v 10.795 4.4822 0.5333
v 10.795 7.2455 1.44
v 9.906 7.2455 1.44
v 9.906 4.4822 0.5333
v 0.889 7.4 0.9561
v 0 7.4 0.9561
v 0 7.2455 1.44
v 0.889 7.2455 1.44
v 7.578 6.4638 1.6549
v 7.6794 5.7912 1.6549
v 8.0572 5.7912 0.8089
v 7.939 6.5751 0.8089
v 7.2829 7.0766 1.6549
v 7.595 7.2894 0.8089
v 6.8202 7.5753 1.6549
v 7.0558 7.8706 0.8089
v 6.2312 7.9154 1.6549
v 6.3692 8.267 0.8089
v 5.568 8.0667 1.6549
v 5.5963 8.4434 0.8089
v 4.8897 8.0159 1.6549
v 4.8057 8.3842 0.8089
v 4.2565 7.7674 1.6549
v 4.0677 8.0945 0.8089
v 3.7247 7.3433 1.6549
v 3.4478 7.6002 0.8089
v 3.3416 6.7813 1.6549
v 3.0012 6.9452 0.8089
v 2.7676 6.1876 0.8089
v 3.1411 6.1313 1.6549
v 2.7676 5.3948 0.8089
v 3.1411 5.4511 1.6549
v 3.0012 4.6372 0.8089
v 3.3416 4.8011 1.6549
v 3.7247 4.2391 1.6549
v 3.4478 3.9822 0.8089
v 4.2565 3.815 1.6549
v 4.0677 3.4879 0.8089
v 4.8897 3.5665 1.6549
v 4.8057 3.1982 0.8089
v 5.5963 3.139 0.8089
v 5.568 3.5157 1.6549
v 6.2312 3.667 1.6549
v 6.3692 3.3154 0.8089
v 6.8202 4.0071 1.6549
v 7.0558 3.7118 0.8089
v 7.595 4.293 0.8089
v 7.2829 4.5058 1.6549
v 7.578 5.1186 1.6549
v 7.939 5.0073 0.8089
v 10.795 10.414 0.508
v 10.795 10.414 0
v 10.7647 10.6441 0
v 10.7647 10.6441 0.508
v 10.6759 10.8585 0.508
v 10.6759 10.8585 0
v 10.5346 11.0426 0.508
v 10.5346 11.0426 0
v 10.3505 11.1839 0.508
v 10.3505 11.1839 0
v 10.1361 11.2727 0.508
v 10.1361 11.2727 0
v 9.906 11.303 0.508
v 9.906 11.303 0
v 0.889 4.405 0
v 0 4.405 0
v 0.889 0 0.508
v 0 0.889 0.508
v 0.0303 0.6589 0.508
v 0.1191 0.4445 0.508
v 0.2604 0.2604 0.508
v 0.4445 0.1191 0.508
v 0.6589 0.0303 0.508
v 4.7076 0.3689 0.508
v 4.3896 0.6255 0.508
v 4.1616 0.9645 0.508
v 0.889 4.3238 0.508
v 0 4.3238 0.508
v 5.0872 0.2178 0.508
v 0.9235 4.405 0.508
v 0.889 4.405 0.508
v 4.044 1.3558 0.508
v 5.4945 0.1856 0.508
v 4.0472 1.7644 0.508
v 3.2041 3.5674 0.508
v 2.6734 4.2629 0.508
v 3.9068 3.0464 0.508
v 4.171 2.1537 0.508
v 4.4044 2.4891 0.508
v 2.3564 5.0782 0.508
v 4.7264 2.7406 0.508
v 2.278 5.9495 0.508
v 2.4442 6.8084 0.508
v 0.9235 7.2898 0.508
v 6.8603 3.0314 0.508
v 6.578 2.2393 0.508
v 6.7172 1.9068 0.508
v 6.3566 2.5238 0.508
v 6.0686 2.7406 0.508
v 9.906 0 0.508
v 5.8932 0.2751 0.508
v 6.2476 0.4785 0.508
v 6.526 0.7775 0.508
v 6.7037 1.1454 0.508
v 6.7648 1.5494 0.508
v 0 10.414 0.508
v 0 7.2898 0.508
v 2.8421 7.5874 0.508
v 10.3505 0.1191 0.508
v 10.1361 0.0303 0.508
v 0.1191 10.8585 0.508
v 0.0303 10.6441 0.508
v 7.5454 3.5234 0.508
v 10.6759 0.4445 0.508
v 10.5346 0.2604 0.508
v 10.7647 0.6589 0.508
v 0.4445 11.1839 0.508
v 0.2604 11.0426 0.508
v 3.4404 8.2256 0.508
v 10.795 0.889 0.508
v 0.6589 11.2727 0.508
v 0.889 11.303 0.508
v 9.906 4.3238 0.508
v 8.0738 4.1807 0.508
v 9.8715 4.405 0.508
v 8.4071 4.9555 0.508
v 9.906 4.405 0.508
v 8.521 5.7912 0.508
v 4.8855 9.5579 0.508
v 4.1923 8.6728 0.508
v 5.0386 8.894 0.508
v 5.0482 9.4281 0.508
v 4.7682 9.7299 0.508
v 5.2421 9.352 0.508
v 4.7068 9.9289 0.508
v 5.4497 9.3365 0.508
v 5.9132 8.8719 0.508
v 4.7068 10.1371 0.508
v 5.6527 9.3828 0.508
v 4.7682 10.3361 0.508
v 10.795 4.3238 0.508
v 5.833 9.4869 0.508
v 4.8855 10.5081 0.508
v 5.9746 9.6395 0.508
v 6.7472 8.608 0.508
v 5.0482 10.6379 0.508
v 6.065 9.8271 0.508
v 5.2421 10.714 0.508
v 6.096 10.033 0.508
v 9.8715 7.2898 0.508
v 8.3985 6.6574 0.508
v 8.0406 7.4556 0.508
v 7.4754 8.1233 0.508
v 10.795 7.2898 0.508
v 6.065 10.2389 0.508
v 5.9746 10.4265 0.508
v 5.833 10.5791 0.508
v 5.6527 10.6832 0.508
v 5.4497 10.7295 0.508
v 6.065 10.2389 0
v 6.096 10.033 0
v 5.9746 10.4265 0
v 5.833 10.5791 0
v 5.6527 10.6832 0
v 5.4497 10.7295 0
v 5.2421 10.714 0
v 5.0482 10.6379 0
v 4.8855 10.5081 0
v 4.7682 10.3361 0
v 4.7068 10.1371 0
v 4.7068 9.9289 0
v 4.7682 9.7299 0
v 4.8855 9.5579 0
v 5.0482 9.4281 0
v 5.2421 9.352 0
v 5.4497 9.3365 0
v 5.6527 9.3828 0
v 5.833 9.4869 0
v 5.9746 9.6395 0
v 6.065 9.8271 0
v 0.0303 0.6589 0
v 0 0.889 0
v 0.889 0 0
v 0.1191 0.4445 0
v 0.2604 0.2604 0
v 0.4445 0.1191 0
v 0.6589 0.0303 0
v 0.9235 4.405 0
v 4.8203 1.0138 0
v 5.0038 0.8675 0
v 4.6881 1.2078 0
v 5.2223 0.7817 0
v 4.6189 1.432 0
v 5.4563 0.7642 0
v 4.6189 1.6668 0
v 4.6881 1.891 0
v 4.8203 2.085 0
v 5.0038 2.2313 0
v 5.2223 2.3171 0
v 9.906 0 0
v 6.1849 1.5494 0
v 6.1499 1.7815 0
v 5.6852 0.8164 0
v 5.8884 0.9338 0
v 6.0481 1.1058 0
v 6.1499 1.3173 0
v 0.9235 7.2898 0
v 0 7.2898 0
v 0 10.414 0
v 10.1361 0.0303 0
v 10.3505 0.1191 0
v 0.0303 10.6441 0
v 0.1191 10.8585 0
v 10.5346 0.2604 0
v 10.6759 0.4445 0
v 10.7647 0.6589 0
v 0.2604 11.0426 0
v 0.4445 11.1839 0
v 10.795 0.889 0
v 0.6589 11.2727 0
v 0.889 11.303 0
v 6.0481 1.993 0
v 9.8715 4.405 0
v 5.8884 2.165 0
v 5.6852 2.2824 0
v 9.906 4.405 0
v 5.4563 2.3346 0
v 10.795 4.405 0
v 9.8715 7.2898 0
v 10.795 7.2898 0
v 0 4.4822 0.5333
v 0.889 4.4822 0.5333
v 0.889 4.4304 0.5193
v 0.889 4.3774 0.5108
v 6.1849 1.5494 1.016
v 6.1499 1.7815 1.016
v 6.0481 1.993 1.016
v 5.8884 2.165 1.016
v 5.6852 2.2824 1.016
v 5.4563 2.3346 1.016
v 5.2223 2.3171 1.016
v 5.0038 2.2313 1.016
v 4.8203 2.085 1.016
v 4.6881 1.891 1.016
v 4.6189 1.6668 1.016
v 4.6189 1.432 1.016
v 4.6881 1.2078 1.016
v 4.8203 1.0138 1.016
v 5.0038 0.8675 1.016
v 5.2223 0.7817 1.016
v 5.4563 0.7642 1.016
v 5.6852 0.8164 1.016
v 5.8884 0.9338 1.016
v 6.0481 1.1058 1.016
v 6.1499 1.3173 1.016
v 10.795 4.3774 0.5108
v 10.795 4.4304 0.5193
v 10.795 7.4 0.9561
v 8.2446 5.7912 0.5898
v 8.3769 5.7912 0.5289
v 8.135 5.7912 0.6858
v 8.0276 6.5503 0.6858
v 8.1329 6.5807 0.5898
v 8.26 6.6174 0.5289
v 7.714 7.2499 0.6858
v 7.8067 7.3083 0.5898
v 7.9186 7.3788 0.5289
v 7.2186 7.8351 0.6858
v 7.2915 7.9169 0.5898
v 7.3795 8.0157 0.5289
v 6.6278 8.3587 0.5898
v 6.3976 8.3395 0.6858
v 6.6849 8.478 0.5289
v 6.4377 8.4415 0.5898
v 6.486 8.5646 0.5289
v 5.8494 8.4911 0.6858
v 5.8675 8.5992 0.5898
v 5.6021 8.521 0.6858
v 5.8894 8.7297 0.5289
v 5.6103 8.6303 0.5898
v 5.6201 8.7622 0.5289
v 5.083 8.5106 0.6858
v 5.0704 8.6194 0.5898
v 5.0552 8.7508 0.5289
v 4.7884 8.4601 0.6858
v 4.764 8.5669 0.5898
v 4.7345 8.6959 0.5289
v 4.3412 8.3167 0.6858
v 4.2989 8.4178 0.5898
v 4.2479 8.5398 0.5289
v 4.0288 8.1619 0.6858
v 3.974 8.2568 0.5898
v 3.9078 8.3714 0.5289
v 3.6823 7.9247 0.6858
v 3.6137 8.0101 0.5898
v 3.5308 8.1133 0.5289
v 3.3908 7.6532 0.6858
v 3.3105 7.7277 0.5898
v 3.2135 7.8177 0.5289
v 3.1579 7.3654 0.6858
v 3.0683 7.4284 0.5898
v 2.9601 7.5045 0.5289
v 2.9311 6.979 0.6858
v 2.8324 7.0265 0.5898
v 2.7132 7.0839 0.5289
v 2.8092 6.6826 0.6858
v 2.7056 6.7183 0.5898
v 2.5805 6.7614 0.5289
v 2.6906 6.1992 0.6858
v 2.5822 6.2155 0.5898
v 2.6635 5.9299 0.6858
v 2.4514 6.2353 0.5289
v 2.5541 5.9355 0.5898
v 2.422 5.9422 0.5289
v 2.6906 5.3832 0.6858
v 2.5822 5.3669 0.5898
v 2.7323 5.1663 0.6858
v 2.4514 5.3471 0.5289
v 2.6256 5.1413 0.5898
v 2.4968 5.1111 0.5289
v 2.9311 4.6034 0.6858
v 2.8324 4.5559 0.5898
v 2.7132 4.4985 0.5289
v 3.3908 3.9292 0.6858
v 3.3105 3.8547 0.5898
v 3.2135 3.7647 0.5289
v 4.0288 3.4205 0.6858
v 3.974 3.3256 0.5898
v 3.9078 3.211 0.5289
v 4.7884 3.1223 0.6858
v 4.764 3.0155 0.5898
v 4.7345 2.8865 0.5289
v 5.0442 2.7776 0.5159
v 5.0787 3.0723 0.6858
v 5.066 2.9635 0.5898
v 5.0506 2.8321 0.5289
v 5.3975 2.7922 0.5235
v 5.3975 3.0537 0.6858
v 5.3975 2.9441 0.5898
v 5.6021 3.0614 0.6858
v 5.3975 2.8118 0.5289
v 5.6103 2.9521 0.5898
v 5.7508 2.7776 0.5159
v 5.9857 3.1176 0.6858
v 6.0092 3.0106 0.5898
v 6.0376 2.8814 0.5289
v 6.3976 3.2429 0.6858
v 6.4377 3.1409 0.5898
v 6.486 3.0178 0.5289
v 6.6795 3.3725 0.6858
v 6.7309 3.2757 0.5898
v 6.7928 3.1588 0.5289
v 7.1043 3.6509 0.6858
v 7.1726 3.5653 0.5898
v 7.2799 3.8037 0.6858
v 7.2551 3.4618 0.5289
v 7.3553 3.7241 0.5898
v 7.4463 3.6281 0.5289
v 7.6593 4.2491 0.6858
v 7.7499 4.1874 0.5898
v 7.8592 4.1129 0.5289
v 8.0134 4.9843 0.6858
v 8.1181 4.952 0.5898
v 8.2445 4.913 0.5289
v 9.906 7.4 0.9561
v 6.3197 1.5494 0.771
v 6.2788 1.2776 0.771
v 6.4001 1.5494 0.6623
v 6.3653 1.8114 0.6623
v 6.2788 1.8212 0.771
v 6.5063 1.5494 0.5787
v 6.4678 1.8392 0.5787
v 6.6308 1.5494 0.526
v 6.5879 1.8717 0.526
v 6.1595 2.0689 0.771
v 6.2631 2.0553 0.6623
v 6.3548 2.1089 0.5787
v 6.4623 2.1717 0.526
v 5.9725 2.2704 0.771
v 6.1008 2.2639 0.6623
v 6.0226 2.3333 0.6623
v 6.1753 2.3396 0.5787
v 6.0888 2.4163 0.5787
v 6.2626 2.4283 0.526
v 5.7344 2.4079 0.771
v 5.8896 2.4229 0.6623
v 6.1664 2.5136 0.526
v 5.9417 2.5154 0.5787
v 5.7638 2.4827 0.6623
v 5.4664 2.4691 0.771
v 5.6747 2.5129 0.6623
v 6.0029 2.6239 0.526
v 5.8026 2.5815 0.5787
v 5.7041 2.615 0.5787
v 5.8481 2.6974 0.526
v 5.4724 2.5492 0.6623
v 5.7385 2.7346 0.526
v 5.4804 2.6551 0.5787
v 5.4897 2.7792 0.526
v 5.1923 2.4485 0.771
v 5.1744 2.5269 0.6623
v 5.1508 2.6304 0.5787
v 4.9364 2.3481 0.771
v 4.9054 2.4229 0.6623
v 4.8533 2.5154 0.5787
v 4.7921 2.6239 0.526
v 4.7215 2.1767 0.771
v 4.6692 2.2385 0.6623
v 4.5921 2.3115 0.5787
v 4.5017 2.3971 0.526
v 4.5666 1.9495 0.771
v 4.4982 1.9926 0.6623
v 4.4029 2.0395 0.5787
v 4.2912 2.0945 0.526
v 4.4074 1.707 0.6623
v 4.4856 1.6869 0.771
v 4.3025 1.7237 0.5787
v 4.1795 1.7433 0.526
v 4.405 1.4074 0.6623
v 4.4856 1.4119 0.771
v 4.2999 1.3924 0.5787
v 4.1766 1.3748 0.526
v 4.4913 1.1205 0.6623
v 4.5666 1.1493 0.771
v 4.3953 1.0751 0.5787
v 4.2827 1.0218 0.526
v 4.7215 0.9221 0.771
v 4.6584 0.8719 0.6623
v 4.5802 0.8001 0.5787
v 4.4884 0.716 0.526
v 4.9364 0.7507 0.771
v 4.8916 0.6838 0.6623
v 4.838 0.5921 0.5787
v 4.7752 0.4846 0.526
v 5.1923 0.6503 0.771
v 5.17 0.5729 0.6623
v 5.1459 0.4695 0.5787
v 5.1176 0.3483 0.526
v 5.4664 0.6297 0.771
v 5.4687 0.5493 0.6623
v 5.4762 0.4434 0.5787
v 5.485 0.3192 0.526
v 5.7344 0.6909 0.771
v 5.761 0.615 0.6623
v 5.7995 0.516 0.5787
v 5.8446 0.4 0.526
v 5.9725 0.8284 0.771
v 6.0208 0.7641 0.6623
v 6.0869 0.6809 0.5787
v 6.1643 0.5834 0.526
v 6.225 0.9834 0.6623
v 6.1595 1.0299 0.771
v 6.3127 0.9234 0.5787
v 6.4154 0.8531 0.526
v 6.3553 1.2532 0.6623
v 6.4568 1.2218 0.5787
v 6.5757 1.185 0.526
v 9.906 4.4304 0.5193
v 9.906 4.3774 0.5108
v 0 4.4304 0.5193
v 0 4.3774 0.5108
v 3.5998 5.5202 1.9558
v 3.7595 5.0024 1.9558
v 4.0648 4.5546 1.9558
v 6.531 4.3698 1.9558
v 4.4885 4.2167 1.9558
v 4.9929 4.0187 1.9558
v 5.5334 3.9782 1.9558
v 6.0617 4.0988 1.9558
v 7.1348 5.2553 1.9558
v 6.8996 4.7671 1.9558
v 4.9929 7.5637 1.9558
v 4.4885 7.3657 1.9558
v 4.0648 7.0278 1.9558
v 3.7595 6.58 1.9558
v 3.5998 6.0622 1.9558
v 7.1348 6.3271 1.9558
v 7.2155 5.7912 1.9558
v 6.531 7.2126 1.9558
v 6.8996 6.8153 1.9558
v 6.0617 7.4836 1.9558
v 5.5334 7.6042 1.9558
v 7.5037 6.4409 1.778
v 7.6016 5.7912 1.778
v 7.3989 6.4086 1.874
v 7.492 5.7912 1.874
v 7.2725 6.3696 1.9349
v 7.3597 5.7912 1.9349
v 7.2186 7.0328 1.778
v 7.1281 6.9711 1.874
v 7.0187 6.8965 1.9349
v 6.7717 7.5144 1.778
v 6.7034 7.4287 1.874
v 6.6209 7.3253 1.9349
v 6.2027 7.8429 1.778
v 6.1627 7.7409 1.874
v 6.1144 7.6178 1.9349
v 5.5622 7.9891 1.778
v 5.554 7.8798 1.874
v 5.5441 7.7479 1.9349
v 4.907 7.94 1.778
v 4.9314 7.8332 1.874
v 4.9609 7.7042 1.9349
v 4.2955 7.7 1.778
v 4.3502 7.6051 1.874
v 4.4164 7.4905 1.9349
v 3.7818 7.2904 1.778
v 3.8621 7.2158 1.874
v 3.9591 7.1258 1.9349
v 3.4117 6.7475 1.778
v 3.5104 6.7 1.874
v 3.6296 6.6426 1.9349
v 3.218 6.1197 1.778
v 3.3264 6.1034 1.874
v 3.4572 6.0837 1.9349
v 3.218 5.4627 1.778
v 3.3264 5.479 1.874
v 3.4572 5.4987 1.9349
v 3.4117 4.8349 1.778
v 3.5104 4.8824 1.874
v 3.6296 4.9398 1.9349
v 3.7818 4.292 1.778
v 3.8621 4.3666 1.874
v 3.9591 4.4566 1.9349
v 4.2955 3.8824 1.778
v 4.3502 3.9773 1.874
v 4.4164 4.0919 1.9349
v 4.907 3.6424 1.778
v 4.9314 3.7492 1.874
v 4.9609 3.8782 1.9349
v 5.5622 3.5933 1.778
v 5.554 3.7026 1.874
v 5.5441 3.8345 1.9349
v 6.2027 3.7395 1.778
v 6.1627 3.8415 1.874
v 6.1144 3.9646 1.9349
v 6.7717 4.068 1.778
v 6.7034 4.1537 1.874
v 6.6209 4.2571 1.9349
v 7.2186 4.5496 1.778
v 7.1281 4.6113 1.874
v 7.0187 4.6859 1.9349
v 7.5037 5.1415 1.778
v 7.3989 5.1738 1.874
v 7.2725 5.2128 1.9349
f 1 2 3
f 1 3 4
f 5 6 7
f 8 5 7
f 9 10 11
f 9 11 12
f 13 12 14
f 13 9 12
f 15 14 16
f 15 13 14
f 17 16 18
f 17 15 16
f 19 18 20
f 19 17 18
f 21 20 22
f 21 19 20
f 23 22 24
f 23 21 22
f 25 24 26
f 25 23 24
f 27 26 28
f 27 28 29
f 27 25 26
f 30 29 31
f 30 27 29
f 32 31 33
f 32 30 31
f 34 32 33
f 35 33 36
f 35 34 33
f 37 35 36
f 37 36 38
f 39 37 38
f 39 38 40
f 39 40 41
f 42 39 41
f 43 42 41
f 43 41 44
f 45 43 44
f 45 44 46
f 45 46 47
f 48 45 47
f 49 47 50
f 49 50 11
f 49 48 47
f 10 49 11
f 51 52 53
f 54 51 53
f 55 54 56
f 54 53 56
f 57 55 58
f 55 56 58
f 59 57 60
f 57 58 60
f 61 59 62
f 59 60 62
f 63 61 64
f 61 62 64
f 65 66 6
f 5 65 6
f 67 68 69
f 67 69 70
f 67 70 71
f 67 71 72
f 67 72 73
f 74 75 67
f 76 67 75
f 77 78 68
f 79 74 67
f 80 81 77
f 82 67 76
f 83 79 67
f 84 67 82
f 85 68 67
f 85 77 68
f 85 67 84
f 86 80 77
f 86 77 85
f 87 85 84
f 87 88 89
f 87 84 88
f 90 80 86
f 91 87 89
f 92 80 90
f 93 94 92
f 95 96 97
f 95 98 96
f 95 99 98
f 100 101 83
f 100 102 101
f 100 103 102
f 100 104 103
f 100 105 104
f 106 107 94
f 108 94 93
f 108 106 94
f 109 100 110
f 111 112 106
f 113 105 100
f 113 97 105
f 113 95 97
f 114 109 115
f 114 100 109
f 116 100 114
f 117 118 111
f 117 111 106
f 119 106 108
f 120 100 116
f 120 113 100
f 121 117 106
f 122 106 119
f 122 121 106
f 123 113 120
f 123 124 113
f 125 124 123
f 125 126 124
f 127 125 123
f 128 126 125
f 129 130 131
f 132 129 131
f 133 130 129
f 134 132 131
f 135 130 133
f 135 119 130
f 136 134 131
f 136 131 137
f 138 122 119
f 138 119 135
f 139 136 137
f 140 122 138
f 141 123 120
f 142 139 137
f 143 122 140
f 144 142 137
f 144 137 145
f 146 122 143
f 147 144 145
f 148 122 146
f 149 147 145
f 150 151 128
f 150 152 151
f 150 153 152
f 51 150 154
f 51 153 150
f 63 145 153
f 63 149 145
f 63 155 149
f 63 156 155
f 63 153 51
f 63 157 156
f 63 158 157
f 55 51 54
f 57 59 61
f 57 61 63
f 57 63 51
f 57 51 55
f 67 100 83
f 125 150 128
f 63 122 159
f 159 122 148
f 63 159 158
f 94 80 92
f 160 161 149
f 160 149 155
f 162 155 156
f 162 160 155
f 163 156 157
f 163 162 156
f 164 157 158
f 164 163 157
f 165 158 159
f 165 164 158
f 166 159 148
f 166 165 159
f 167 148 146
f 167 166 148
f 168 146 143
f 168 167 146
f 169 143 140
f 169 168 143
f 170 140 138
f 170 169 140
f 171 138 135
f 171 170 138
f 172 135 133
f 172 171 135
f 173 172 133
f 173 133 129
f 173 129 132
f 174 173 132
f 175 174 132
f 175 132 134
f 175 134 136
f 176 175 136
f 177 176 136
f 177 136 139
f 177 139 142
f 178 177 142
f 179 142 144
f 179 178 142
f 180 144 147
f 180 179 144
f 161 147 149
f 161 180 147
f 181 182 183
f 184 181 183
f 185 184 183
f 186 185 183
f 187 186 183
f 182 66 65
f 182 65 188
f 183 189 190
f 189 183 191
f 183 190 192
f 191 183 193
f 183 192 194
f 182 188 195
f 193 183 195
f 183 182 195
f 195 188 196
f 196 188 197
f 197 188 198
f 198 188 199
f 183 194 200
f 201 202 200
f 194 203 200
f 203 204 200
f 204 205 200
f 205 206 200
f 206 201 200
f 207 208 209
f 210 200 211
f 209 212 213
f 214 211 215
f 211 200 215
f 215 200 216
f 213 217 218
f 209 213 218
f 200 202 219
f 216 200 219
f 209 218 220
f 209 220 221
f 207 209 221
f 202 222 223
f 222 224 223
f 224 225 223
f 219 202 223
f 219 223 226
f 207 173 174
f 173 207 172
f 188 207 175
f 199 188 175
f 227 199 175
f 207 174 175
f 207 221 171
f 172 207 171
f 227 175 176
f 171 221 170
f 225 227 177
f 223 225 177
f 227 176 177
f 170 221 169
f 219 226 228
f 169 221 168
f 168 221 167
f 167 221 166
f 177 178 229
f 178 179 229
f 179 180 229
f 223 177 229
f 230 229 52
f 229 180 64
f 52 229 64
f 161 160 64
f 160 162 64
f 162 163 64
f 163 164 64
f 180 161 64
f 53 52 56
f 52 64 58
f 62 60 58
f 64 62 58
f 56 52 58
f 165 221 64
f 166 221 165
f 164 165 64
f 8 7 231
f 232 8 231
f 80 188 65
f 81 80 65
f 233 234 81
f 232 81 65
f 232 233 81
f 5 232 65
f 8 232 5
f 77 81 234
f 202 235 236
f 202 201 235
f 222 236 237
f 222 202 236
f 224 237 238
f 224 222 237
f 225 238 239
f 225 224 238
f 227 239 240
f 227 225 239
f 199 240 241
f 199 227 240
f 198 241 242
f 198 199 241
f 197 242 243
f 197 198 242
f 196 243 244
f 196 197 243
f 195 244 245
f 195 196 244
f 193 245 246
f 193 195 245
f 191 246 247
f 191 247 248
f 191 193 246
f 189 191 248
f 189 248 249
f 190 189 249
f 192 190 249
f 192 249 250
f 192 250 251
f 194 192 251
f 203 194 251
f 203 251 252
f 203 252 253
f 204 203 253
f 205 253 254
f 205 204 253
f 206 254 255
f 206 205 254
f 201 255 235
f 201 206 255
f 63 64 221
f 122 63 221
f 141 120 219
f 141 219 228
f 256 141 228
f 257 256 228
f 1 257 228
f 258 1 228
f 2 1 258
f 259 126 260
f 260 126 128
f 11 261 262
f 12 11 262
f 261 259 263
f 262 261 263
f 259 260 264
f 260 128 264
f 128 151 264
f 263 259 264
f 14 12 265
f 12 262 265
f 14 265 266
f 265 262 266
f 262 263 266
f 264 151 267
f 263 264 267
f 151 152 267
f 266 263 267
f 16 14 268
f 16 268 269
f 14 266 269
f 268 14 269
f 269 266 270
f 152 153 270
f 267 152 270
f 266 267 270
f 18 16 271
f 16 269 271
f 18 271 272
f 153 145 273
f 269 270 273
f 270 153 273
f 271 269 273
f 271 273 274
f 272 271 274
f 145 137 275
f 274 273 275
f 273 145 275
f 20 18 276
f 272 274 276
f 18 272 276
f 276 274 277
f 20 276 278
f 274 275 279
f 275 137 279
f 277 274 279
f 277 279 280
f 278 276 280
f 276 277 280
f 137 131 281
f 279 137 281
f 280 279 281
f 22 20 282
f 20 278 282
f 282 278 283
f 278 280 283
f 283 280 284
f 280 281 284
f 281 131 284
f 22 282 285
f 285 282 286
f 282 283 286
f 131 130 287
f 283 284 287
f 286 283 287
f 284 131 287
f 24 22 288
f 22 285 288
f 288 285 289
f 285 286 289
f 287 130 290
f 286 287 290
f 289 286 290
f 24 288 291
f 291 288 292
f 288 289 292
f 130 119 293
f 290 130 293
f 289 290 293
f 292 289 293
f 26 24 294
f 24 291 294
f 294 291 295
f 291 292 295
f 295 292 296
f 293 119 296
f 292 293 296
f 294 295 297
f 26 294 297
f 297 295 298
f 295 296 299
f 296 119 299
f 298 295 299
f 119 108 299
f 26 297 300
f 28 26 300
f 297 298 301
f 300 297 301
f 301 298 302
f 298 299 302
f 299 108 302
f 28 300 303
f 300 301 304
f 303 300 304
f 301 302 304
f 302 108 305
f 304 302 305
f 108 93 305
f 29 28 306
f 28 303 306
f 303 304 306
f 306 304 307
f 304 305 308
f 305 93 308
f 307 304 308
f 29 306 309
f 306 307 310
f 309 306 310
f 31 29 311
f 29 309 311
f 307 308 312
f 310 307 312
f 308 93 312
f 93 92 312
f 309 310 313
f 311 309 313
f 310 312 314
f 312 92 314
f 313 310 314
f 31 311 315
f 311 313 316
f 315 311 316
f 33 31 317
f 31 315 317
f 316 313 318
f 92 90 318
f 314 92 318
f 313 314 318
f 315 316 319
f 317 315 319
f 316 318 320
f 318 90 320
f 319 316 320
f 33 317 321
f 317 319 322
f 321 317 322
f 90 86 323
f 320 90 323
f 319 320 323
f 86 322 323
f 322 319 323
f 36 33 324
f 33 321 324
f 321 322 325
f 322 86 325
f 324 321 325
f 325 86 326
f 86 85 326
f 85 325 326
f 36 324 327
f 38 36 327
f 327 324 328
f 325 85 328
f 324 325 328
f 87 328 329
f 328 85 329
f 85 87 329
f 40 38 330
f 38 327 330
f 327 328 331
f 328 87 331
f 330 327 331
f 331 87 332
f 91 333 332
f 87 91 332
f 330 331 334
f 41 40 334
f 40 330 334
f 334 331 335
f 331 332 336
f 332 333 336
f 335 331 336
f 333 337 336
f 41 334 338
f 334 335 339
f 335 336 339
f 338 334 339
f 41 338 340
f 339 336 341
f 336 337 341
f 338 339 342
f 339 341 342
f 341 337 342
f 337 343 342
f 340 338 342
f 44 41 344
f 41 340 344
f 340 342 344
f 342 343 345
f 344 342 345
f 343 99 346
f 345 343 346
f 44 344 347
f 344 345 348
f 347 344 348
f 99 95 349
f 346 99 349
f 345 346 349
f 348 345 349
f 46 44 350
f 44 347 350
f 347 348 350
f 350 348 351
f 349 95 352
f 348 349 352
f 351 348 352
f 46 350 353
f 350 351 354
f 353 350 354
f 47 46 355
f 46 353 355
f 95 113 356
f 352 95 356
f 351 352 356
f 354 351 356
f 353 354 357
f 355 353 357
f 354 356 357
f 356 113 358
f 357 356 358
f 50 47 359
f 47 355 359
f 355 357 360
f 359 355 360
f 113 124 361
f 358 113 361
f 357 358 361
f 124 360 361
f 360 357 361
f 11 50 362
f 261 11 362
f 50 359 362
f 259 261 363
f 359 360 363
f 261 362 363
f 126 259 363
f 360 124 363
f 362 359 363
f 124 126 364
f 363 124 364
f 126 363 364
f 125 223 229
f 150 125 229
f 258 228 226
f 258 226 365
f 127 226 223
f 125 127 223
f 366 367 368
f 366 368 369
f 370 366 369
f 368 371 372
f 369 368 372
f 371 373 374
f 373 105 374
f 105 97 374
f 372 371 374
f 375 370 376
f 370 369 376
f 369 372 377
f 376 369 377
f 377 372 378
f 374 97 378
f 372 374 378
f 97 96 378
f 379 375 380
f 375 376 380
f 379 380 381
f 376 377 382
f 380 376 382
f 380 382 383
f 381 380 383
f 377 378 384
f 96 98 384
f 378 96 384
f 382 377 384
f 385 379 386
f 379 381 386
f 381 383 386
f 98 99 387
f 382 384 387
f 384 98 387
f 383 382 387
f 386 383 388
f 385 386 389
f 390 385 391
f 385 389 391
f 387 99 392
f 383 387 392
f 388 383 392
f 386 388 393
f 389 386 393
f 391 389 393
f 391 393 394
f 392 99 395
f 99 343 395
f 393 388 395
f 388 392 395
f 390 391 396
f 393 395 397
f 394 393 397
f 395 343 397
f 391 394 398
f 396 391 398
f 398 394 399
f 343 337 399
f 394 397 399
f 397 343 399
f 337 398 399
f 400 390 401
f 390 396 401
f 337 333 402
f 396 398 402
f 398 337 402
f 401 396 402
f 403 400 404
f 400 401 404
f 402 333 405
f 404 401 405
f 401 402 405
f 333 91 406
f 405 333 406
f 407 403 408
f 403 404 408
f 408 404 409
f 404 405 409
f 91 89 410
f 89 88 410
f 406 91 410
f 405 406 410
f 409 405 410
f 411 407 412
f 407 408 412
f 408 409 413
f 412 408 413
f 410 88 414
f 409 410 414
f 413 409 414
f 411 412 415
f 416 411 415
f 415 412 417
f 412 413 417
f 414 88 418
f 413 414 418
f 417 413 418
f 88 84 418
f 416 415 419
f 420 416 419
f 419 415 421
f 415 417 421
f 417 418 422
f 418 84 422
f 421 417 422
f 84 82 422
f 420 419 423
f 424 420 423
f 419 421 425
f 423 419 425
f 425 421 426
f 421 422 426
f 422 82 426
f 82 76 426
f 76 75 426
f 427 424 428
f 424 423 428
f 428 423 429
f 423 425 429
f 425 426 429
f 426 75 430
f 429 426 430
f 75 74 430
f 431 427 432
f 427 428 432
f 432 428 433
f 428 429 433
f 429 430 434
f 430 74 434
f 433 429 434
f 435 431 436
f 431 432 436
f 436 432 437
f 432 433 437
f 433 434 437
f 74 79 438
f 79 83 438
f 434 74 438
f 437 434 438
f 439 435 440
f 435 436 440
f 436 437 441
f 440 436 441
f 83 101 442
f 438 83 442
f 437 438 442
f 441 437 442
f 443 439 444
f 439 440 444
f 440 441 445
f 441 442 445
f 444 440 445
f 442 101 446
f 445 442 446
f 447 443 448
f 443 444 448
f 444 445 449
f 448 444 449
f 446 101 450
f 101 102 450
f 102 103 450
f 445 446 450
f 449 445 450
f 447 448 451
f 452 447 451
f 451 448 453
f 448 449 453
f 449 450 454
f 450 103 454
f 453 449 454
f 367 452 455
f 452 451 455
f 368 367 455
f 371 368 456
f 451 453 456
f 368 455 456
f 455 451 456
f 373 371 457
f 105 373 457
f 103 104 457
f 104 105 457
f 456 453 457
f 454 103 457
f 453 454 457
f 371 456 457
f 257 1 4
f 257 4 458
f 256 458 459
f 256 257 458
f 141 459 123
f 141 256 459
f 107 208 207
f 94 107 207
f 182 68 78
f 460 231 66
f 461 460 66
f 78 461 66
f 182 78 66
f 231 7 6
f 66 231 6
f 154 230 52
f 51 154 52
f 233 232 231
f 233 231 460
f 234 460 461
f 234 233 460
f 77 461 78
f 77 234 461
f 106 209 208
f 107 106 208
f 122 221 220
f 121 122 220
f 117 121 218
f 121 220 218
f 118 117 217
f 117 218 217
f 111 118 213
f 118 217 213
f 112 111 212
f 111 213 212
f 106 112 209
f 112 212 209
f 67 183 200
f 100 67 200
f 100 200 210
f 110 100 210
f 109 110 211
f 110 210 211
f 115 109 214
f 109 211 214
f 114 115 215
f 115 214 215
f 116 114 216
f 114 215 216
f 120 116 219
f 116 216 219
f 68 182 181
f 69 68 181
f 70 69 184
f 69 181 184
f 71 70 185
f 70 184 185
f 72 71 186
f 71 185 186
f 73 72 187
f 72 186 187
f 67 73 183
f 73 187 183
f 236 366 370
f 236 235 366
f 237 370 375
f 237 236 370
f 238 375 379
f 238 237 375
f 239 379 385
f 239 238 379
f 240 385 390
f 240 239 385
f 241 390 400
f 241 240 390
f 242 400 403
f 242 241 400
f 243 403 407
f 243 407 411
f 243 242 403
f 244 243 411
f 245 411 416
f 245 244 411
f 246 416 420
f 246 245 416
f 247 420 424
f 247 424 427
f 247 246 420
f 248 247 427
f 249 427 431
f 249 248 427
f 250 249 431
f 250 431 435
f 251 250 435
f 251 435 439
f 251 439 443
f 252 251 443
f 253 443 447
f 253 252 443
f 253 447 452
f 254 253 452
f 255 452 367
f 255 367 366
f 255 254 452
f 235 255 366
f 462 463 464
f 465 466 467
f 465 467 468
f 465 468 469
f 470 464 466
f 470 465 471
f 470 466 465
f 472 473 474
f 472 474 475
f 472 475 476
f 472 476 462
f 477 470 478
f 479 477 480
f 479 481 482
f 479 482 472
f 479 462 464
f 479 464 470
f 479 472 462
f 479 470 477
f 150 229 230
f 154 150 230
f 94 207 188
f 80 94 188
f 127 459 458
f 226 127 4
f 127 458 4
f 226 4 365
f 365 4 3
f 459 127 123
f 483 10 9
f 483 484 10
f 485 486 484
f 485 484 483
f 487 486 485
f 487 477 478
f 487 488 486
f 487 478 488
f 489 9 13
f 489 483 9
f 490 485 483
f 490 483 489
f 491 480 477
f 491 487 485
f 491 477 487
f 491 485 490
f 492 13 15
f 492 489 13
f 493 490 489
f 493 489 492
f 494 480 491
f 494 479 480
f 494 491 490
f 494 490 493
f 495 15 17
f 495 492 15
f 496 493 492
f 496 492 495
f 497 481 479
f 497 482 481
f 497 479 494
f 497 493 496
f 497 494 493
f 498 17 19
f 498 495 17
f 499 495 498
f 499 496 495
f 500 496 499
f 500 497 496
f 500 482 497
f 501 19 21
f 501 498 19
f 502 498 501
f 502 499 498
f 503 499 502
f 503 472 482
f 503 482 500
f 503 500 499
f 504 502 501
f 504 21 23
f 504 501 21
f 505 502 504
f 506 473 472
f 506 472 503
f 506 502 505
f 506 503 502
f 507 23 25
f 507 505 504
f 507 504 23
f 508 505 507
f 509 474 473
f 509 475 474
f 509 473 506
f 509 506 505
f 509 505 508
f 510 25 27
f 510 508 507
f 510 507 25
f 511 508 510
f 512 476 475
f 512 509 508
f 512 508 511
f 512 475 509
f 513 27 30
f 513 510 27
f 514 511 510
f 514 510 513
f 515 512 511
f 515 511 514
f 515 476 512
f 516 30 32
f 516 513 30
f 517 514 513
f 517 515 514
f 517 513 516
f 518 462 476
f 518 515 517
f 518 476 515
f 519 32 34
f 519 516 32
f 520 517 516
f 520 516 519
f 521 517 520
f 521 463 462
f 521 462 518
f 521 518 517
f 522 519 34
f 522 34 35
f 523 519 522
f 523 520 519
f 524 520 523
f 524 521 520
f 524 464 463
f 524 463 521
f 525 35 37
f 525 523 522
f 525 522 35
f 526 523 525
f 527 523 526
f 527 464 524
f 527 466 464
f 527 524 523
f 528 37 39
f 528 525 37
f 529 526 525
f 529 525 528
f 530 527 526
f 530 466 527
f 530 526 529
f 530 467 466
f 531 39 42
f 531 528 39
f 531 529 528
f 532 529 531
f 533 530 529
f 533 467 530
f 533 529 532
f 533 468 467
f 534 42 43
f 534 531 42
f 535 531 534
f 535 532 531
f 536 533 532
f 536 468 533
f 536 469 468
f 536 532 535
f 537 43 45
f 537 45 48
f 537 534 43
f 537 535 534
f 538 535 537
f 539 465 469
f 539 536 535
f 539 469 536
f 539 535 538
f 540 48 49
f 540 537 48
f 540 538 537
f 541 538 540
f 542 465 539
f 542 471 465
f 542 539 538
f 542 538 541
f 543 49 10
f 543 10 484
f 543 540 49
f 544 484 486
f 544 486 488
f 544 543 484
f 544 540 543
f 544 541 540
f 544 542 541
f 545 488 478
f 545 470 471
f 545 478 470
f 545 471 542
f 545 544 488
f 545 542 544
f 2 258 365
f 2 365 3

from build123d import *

# Parameters (mm, degrees)
SKETCH1_R           = 0.6985
SKETCH1_R_2         = 0.7874
BOSS_EXTRUDE1_DEPTH = 0.508
SKETCH3_R           = 2.794
SKETCH4_R           = 2.147566379
SKETCH5_R           = 1.067023976
SKETCH6_R           = 0.7874
CUT_EXTRUDE1_START  = -0.508
SKETCH7_R           = 0.7874
CUT_EXTRUDE1_DEPTH  = 0.508
BOSS_EXTRUDE2_DEPTH = 0.889
BOSS_EXTRUDE3_DEPTH = 0.889
FILLET1_R           = 0.508


with BuildPart() as part:
    # Sketch1 → Boss-Extrude1 (new body)
    with BuildSketch(Plane.XY):
        with BuildLine():
            Line((0.889, 0), (9.906, 0))
            ThreePointArc((9.906, 0), (10.534617928, 0.260382072), (10.795, 0.889))
            Line((10.795, 0.889), (10.795, 4.405000935))
            Line((10.795, 4.405000935), (9.871541288, 4.405000935))
            Line((9.871541288, 4.405000935), (9.871541288, 7.2898))
            Line((9.871541288, 7.2898), (10.795, 7.2898))
            Line((10.795, 7.2898), (10.795, 10.414))
            ThreePointArc((10.795, 10.414), (10.534617928, 11.042617928), (9.906, 11.303))
            Line((9.906, 11.303), (0.889, 11.303))
            ThreePointArc((0.889, 11.303), (0.260382072, 11.042617928), (0, 10.414))
            Line((0, 10.414), (0, 7.2898))
            Line((0, 7.2898), (0.923458712, 7.2898))
            Line((0.923458712, 7.2898), (0.923458712, 4.405000935))
            Line((0.923458712, 4.405000935), (0, 4.405000935))
            Line((0, 4.405000935), (0, 0.889))
            ThreePointArc((0, 0.889), (0.260382072, 0.260382072), (0.889, 0))
        make_face()
        with Locations((5.3975, 10.033)):
            Circle(SKETCH1_R, mode=Mode.SUBTRACT)
        with Locations((5.3975, 1.5494)):
            Circle(SKETCH1_R_2, mode=Mode.SUBTRACT)
    extrude(amount=BOSS_EXTRUDE1_DEPTH)

    # Sketch3 → Loft1 section 0
    with BuildSketch(Plane.XY.offset(0.508)):
        with Locations((5.3975, 5.7912)):
            Circle(SKETCH3_R)
    # Sketch4 → Loft1 section 1
    with BuildSketch(Plane.XY.offset(1.9558)):
        with Locations((5.3975, 5.7912)):
            Circle(SKETCH4_R)
    loft()

    # Sketch5 → Loft2 section 0
    with BuildSketch(Plane.XY.offset(0.508)):
        with Locations((5.3975, 1.5494)):
            Circle(SKETCH5_R)
    # Sketch6 → Loft2 section 1
    with BuildSketch(Plane.XY.offset(1.016)):
        with Locations((5.3975, 1.5494)):
            Circle(SKETCH6_R)
    loft()

    # Sketch7 → Cut-Extrude1 (cut)
    with BuildSketch(Plane.XY.offset(1.016).offset(CUT_EXTRUDE1_START)):
        with Locations((5.3975, 1.5494)):
            Circle(SKETCH7_R)
    extrude(amount=CUT_EXTRUDE1_DEPTH, mode=Mode.SUBTRACT)

    # Sketch9 → Boss-Extrude2 (add)
    with BuildSketch(Plane.ZY):
        Polygon((0, 4.405000935), (0.956058861, 7.4), (1.44, 7.245517076), (0.508, 4.405000935), align=None)
    extrude(amount=-BOSS_EXTRUDE2_DEPTH)

    # Sketch10 → Boss-Extrude3 (add)
    with BuildSketch(Plane(origin=(10.795, 0, 0), x_dir=(0, 0, -1), z_dir=(1, 0, 0))):
        Polygon((-1.44, 7.245517076), (-0.508, 4.405000935), (0, 4.405000935), (-0.956058861, 7.4), align=None)
    extrude(amount=-BOSS_EXTRUDE3_DEPTH)

    # Fillet1
    # the kernel refuses this fillet: 0.508 mm, written as the material it adds along each edge
    with BuildSketch(Plane(origin=(10.795, 4.405000935, 0.508), x_dir=(0, -1, 0), z_dir=(-1, 0, 0)), Plane(origin=(0.889, 4.405000935, 0.508), x_dir=(0, -1, 0), z_dir=(-1, 0, 0))) as fillet1_piece_1:
        with BuildLine():
            CenterArc((FILLET1_R * 0.159862126559, FILLET1_R), FILLET1_R, 251.83485126, 18.16514874)
            Line((-FILLET1_R * 0.151894895434, FILLET1_R * 0.0498381405053), (0, 0))
            Line((0, 0), (FILLET1_R * 0.159862126559, 0))
        make_face()
    extrude(amount=0.889)
    with BuildSketch(Plane(origin=(5.3975, 5.7912, 0.508), x_dir=(1, 0, 0), z_dir=(0, -1, 0))) as fillet1_piece_2:
        with BuildLine():
            CenterArc((2.794 + FILLET1_R * 0.648657698793, FILLET1_R), FILLET1_R, 204.060462248, 65.939537752)
            Line((2.794 - FILLET1_R * 0.264458035208, FILLET1_R * 0.592299550749), (2.794, 0))
            Line((2.794, 0), (2.794 + FILLET1_R * 0.648657698793, 0))
        make_face()
    revolve(axis=Axis((5.3975, 5.7912, 0.508), (0, 0, 1)))
    with BuildSketch(Plane(origin=(5.3975, 1.5494, 0.508), x_dir=(1, 0, 0), z_dir=(0, -1, 0))) as fillet1_piece_3:
        with BuildLine():
            CenterArc((1.067023976 + FILLET1_R * 0.591042865148, FILLET1_R), FILLET1_R, 208.830184855, 61.169815145)
            Line((1.067023976 - FILLET1_R * 0.285009893371, FILLET1_R * 0.517784732415), (1.067023976, 0))
            Line((1.067023976, 0), (1.067023976 + FILLET1_R * 0.591042865148, 0))
        make_face()
    revolve(axis=Axis((5.3975, 1.5494, 0.508), (0, 0, 1)))
    # the kernel refuses this fillet: 0.508 mm, written as the material it takes off along each edge
    with BuildSketch(Plane(origin=(5.3975, 5.7912, 1.9558), x_dir=(1, 0, 0), z_dir=(0, -1, 0))) as fillet1_2_piece_1:
        with BuildLine():
            CenterArc((2.147566379 - FILLET1_R * 0.648657698793, -FILLET1_R), FILLET1_R, 24.060462248, 65.939537752)
            Line((2.147566379 - FILLET1_R * 0.648657698793, 0), (2.147566379, 0))
            Line((2.147566379, 0), (2.147566379 + FILLET1_R * 0.264458035208, -FILLET1_R * 0.592299550749))
        make_face()
    revolve(axis=Axis((5.3975, 5.7912, 1.9558), (0, 0, 1)), mode=Mode.SUBTRACT)


solid = part.part
